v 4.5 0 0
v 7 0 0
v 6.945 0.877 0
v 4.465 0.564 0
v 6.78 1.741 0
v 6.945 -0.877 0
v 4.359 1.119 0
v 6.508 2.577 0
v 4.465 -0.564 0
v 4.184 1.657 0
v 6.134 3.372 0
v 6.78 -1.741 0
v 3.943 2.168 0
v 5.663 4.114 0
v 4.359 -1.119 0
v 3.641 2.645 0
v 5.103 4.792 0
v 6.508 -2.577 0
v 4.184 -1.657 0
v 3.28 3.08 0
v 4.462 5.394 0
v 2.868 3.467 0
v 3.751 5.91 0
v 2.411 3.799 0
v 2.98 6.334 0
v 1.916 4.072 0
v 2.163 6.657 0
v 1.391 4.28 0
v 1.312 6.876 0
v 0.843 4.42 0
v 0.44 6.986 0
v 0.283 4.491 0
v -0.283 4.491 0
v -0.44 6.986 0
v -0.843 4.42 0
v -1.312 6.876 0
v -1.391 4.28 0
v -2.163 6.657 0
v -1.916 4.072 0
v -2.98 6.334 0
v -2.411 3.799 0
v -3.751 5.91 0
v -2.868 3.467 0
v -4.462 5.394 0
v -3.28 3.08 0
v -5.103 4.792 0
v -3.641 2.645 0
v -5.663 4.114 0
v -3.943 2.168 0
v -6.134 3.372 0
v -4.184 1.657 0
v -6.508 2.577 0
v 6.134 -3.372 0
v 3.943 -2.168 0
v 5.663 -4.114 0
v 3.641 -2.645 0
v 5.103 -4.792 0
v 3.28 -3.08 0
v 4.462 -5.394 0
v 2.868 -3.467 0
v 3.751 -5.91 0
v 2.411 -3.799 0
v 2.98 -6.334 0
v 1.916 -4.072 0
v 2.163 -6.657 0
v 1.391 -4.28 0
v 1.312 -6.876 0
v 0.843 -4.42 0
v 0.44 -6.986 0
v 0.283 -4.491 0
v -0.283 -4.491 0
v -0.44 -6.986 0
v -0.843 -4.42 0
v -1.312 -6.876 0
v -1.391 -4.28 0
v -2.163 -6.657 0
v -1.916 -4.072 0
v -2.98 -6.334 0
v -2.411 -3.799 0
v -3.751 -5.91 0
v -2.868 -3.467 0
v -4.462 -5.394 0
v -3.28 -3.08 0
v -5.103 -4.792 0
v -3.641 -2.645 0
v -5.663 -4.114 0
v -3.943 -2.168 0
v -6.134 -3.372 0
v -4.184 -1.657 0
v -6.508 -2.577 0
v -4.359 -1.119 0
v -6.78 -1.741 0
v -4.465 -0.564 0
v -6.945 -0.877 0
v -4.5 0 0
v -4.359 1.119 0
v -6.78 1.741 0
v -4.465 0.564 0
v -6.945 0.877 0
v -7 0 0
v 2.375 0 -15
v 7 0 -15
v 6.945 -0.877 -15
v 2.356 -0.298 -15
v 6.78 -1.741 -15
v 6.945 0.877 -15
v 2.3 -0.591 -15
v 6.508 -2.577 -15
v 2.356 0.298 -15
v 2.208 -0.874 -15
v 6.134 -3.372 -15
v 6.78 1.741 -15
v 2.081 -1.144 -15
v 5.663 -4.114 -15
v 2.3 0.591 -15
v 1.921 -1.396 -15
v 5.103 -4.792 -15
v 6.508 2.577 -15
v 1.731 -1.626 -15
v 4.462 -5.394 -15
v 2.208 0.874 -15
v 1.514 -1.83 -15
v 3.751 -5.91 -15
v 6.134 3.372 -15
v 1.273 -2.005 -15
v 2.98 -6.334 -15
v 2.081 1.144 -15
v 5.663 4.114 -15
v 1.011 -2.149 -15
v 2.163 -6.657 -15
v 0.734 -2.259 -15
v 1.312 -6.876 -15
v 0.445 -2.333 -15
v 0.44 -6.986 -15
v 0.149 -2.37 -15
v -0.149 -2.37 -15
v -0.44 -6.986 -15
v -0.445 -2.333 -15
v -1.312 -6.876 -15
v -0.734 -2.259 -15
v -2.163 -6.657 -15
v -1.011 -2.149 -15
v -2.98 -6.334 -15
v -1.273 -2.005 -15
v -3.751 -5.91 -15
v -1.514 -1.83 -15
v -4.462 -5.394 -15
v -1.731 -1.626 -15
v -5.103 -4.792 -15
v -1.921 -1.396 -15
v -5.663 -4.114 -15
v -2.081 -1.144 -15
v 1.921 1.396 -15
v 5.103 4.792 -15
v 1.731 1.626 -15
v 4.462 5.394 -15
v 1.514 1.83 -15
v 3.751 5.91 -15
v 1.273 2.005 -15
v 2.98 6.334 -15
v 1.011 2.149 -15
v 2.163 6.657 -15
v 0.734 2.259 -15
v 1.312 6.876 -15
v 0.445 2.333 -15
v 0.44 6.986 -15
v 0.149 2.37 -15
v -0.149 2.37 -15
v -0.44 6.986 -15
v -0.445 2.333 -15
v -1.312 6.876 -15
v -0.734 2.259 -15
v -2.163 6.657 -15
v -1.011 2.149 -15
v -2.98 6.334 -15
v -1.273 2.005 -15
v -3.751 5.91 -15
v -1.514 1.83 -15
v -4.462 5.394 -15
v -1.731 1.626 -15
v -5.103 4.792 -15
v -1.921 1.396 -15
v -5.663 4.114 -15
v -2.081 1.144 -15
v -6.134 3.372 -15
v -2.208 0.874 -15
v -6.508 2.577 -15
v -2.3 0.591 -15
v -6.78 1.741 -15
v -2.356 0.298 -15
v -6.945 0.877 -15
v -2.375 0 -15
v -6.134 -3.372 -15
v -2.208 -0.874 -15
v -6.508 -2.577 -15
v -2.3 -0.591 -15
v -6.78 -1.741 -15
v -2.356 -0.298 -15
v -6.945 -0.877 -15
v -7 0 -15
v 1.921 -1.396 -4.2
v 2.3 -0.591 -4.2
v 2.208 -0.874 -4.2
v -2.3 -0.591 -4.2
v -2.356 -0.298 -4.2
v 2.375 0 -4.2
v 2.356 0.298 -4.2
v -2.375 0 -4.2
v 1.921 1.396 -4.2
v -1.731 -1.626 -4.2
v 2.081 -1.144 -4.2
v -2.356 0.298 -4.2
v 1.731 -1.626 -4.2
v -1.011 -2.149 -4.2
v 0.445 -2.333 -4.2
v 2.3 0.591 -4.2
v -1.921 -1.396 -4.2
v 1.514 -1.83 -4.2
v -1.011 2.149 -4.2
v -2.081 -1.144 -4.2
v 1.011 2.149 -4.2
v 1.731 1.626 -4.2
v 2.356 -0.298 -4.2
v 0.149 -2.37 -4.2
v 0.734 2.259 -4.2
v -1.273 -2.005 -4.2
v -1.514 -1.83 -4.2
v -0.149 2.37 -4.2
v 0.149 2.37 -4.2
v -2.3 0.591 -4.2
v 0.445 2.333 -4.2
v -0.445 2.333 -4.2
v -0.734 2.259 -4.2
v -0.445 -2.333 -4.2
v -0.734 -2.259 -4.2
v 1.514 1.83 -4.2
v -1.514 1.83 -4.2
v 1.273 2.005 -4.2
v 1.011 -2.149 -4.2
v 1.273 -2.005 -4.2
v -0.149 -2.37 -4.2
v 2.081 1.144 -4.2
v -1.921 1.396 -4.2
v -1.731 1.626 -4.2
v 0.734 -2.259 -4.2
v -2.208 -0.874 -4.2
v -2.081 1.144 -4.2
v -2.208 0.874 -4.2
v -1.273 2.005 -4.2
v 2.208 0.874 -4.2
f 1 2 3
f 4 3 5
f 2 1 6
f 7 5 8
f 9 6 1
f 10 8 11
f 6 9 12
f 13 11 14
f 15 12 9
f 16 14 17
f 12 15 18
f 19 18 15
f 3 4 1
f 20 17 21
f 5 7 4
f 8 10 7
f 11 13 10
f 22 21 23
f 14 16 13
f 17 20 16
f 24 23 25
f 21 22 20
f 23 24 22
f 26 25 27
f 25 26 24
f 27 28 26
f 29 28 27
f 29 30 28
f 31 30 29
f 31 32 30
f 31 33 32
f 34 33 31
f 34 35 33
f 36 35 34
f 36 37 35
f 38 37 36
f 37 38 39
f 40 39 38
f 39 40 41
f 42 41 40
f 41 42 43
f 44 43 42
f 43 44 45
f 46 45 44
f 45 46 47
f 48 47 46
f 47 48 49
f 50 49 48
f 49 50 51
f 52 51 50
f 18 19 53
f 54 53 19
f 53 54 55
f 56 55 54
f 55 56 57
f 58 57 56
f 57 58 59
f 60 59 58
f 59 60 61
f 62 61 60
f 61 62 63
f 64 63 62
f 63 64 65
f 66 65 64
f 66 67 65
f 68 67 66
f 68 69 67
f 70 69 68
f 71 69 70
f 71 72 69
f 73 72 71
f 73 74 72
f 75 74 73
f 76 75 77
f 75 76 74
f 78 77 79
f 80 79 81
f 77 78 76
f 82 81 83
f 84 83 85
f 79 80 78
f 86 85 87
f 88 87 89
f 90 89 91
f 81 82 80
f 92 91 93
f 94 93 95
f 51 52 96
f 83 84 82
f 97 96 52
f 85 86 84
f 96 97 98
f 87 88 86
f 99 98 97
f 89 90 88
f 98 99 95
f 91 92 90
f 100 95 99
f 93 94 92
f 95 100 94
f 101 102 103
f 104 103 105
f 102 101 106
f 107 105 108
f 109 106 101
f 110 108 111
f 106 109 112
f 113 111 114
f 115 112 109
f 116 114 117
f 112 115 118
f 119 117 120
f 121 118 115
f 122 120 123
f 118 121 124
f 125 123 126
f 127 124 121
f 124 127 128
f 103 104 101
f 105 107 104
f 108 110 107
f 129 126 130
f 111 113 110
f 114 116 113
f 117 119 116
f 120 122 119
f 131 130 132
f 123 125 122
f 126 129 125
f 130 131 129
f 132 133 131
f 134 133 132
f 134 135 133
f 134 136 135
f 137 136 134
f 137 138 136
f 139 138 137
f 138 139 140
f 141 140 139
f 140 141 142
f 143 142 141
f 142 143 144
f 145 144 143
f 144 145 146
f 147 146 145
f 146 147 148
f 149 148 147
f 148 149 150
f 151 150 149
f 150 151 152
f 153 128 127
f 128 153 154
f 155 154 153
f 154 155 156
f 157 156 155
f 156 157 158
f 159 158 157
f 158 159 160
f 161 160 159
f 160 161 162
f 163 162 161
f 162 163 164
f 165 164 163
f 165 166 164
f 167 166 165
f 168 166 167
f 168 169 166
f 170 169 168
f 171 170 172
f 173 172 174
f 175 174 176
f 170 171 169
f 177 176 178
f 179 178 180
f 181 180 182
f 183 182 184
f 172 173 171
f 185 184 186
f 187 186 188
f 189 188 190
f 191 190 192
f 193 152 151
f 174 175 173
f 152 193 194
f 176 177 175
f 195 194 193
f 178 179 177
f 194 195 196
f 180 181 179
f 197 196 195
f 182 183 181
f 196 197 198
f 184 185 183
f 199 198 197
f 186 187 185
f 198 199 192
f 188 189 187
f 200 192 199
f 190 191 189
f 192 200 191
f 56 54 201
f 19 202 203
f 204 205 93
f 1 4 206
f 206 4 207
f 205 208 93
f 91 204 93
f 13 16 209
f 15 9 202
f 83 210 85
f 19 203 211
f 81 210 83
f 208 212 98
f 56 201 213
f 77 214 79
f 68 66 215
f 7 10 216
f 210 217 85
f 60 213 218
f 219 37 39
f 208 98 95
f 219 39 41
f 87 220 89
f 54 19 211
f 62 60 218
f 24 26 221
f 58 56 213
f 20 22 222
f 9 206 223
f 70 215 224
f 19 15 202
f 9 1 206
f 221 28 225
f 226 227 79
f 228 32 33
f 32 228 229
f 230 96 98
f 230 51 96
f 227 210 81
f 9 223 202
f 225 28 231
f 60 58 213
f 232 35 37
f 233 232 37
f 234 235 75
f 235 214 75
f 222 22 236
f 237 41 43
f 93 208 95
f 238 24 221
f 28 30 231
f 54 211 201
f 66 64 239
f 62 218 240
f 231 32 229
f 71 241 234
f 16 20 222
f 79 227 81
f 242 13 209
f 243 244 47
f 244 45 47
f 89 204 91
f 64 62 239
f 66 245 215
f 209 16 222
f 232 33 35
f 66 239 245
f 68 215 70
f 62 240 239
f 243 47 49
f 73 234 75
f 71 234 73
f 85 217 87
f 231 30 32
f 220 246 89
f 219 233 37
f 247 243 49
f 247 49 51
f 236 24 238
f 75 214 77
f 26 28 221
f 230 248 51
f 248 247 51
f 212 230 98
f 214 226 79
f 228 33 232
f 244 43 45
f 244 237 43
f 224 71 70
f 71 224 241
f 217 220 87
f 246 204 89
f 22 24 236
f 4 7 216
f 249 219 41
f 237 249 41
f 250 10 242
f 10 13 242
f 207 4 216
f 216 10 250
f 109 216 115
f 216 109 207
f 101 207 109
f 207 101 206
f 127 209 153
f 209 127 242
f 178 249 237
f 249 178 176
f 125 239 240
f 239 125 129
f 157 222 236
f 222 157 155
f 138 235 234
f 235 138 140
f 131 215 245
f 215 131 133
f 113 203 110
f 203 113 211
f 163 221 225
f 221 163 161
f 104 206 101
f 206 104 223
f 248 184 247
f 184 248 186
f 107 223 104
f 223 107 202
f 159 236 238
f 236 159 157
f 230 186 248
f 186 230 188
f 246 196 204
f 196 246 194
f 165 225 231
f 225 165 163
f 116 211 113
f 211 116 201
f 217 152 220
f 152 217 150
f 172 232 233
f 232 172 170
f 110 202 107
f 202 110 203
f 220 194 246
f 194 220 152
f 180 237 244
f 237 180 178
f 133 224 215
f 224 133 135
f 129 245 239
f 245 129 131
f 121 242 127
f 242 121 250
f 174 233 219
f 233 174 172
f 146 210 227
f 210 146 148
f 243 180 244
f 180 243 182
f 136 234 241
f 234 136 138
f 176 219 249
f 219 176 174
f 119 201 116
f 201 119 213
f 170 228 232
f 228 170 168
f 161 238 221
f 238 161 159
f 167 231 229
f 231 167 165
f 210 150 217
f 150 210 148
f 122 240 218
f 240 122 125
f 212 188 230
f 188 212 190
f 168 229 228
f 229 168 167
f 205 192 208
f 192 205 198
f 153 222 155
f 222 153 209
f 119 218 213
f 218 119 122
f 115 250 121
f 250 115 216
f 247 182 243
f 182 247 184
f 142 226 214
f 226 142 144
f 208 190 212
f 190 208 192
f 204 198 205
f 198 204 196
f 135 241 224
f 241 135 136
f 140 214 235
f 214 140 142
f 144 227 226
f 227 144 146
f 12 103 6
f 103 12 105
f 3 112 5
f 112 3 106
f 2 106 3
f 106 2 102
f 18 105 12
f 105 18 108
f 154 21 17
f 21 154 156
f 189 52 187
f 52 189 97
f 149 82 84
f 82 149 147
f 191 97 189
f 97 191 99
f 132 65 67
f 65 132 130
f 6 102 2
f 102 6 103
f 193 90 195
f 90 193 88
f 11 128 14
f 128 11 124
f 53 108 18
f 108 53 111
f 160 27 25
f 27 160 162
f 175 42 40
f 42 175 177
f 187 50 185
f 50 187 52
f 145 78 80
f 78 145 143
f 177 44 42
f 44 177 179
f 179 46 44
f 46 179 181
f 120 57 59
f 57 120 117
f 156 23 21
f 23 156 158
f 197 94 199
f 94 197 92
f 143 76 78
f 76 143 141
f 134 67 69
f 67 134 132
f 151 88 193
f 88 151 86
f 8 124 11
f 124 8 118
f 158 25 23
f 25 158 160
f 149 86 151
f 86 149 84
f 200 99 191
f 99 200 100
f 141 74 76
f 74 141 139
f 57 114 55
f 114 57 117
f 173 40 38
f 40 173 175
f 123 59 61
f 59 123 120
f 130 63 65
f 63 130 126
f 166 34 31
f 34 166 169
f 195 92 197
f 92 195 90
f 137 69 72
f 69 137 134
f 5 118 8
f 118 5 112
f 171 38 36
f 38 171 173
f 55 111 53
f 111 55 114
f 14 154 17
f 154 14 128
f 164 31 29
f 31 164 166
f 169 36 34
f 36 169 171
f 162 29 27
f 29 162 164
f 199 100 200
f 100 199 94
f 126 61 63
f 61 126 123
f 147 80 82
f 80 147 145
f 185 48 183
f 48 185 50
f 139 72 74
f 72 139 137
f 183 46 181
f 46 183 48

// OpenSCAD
$fn = 50;


difference() {
	union() {
		translate(v = [0, 0, -15.0000000000]) {
			cylinder(h = 15, r = 7.0000000000);
		}
		cylinder(h = 0, r = 13.0000000000);
	}
	union() {
		translate(v = [0, 0, 0]) {
			rotate(a = [0, 0, 0]) {
				difference() {
					union() {
						#translate(v = [0, 0, -15.0000000000]) {
							cylinder(h = 15, r = 2.2500000000);
						}
						#translate(v = [0, 0, -4.2000000000]) {
							cylinder(h = 4.2000000000, r = 7.0000000000, r1 = 2.3750000000, r2 = 4.5000000000);
						}
						#translate(v = [0, 0, -15.0000000000]) {
							cylinder(h = 15, r = 2.3750000000);
						}
						#translate(v = [0, 0, -15.0000000000]) {
							cylinder(h = 15, r = 2.2500000000);
						}
					}
					union();
				}
			}
		}
	}
}
